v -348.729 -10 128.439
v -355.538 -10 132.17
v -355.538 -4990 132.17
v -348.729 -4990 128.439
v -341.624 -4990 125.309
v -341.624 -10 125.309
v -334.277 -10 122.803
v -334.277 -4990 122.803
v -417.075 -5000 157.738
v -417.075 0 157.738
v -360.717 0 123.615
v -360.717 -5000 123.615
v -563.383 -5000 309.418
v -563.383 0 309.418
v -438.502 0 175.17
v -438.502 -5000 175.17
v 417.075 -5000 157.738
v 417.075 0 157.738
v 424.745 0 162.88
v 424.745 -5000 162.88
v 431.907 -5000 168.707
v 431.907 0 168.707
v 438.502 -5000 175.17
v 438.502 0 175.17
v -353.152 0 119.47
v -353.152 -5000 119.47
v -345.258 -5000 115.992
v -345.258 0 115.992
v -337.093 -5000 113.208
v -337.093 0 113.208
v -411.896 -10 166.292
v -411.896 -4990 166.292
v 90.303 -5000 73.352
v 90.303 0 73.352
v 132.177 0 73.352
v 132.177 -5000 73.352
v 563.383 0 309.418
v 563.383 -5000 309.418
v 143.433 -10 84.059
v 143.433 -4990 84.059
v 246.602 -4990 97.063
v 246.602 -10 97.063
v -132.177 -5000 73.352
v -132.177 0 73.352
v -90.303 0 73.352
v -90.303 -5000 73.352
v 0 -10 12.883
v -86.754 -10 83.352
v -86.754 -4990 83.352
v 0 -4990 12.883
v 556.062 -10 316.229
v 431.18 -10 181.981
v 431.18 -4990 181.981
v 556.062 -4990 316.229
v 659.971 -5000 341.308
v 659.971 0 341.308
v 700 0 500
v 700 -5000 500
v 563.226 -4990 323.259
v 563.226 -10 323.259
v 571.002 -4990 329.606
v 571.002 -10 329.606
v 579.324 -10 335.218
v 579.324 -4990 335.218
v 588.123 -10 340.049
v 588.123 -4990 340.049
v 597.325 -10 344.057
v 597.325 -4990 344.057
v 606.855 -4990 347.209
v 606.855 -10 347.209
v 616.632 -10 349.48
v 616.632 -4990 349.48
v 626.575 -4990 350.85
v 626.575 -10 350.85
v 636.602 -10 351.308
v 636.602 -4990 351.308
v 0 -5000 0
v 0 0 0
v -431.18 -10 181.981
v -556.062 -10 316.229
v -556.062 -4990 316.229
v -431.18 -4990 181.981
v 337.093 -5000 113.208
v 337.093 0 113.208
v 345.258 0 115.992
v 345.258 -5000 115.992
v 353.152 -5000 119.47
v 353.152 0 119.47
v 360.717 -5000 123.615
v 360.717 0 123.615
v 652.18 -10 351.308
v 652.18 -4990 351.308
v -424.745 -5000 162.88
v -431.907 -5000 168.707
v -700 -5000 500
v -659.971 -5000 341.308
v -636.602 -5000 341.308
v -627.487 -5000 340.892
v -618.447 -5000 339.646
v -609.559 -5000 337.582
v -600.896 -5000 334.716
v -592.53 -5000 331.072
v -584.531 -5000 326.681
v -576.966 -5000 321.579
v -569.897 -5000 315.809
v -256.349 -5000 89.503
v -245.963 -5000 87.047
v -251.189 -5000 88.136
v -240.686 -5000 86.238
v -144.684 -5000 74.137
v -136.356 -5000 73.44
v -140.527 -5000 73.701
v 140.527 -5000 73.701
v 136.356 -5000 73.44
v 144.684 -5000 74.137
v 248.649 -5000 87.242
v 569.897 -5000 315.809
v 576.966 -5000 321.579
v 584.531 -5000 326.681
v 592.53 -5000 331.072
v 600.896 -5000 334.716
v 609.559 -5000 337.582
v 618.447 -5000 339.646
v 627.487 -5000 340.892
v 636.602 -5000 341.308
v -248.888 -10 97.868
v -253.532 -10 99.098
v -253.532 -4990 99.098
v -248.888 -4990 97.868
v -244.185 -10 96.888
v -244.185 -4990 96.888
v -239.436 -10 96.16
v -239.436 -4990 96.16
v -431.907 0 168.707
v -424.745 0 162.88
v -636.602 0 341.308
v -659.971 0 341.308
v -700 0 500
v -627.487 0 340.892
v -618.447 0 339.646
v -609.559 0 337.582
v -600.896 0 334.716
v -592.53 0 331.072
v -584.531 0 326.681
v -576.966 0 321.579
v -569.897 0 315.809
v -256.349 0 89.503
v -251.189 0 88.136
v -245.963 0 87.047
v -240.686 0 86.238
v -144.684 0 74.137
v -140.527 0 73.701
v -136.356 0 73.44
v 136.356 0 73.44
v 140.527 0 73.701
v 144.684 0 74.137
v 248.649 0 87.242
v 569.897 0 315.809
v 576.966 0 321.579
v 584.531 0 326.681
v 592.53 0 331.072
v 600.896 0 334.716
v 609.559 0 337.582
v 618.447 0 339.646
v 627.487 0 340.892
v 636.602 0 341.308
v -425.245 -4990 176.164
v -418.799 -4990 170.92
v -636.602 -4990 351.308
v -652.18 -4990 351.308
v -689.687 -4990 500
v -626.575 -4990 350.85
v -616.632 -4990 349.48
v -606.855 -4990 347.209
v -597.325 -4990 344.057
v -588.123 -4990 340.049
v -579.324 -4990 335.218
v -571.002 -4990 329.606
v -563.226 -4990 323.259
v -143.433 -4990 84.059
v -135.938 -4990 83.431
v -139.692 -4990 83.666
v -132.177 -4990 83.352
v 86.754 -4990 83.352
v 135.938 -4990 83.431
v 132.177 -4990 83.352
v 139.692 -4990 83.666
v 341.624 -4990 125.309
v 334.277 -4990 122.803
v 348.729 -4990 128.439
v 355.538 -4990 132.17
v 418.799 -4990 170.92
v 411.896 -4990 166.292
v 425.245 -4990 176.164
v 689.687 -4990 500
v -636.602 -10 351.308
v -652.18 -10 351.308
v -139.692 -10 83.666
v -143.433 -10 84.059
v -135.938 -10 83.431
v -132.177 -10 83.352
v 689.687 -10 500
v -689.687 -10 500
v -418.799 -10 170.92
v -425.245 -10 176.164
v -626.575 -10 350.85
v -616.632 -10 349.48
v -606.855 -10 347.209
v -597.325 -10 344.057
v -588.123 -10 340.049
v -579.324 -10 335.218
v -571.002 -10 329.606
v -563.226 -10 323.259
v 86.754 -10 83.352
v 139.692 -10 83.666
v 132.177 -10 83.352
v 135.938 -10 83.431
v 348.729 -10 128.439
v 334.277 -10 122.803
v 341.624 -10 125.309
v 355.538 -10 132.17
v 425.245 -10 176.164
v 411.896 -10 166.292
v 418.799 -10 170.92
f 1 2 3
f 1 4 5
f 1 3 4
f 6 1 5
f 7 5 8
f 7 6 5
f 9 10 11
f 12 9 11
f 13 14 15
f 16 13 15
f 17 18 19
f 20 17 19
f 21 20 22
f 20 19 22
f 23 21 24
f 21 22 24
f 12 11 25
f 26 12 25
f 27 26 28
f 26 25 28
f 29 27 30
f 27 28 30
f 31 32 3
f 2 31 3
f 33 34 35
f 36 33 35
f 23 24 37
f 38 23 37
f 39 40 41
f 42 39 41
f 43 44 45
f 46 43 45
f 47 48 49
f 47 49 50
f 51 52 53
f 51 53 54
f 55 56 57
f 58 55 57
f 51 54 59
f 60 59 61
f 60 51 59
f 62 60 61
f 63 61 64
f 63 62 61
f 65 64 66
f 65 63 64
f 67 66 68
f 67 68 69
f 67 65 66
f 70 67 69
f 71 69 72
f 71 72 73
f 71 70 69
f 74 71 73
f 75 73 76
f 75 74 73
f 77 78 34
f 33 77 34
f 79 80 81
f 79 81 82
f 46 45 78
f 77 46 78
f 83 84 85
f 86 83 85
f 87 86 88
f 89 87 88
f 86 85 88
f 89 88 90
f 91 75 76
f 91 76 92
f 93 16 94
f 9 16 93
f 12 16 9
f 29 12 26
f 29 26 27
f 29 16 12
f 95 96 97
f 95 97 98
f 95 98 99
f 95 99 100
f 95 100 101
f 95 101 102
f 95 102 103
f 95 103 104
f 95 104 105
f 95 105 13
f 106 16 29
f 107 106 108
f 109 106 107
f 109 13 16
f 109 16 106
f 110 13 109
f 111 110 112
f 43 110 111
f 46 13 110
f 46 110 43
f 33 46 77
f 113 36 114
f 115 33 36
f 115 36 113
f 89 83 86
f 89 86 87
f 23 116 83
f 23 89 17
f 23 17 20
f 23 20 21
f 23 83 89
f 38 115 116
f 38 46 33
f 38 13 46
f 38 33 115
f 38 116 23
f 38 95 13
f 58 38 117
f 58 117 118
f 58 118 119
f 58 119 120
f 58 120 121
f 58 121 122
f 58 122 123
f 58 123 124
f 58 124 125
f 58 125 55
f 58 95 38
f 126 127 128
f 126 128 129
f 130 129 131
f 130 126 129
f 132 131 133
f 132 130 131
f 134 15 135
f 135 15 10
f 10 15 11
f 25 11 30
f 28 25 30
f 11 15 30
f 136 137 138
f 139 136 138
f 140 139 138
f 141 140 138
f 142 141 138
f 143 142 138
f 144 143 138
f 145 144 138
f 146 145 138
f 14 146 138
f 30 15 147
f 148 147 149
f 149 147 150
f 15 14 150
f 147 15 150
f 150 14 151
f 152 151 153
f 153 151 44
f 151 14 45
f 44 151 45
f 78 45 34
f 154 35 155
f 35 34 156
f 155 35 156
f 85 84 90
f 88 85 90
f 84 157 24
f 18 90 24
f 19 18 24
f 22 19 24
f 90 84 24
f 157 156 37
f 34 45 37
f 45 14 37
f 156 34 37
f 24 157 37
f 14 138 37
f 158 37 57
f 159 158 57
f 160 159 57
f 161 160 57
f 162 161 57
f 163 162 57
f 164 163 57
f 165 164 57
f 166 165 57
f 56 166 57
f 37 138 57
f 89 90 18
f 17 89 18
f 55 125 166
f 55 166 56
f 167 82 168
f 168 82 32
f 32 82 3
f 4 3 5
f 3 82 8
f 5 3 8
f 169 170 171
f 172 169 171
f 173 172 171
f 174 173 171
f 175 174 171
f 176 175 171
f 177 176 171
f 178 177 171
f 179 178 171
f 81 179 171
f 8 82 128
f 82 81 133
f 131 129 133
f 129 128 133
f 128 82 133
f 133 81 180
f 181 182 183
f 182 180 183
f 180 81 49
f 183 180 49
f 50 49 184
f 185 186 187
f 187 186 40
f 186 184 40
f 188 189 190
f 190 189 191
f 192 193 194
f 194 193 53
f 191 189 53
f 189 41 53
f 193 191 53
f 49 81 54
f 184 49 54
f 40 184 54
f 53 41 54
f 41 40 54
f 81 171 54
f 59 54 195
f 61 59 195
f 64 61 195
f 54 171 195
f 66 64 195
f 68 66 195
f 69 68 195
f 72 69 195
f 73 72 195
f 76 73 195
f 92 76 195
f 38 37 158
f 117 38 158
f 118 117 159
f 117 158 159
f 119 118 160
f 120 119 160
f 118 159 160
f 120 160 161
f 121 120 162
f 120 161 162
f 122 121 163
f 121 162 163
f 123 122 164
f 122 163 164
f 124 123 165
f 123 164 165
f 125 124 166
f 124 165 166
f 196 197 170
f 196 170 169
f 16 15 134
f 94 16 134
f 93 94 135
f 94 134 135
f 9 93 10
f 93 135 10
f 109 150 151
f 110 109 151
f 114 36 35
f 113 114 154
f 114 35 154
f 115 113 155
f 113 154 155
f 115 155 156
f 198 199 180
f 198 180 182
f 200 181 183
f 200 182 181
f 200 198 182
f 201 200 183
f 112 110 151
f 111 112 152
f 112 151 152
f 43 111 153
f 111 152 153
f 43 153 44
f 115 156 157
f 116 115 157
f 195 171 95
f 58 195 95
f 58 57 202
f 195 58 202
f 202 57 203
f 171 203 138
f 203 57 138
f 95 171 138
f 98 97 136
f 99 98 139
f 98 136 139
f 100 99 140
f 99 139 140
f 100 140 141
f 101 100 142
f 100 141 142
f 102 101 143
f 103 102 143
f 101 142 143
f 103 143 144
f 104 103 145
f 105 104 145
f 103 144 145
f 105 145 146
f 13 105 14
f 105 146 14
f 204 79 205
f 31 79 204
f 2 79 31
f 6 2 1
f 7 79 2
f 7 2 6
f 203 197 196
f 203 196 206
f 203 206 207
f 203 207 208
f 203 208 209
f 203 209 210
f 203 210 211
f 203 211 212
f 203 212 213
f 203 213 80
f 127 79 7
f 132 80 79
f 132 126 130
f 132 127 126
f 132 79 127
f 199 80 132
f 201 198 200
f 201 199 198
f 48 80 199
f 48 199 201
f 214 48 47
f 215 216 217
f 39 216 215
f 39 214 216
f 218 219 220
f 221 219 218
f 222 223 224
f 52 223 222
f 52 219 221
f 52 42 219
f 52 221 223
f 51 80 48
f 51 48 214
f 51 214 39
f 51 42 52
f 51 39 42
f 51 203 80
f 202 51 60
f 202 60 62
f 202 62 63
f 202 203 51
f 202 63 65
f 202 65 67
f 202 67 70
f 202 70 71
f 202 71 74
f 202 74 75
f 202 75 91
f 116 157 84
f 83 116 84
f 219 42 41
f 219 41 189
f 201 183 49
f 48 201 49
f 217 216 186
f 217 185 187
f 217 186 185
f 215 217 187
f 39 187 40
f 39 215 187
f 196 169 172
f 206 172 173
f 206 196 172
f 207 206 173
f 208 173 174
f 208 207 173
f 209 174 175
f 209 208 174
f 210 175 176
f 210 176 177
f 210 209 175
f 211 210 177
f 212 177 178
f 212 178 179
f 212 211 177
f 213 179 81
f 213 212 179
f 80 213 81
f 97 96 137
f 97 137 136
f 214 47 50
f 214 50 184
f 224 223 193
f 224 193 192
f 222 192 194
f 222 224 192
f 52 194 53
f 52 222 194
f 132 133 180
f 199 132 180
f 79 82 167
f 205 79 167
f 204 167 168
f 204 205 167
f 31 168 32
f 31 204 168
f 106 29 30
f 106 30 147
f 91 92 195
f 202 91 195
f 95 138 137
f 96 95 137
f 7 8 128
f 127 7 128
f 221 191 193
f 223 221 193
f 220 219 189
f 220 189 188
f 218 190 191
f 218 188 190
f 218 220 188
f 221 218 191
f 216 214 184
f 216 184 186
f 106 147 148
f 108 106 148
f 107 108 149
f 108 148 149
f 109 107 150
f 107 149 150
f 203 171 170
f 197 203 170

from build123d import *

# Parameters (mm, degrees)
F2_DEPTH = 5000
F3_T     = -10


with BuildPart() as f2:
    # F0 (on Front) → F2 (new body)
    with BuildSketch(Plane.XZ):
        with BuildLine():
            Line((-90.3032645583, 73.3521804214), (0, 0))
            Line((0, 0), (0, 500))
            Line((0, 500), (-700, 500))
            Line((-700, 500), (-659.9707603455, 341.3078779773))
            Line((-659.9707603455, 341.3078779773), (-636.6021653731, 341.3078779773))
            ThreePointArc((-636.6021653731, 341.3078779773), (-596.6712163725, 332.9894972469), (-563.3834841061, 309.4182642155))
            Line((-563.3834841061, 309.4182642155), (-438.5016734996, 175.1702883654))
            ThreePointArc((-438.5016734996, 175.1702883654), (-428.3932790461, 165.710759699), (-417.0752981876, 157.7379540258))
            Line((-417.0752981876, 157.7379540258), (-360.7167568947, 123.615368327))
            ThreePointArc((-360.7167568947, 123.615368327), (-349.2423377723, 117.6459694815), (-337.0934164626, 113.2075319426))
            Line((-337.0934164626, 113.2075319426), (-256.349216299, 89.5028171123))
            ThreePointArc((-256.349216299, 89.5028171123), (-248.5831629557, 87.5568921429), (-240.6863306004, 86.2384660848))
            Line((-240.6863306004, 86.2384660848), (-144.6835198288, 74.1372724315))
            ThreePointArc((-144.6835198288, 74.1372724315), (-138.4427891974, 73.5486464183), (-132.1774400044, 73.3521804214))
            Line((-132.1774400044, 73.3521804214), (-90.3032645583, 73.3521804214))
        make_face()
        with BuildLine():
            Line((0, 500), (0, 0))
            Line((0, 0), (90.3032645583, 73.3521804214))
            Line((90.3032645583, 73.3521804214), (132.1774400044, 73.3521804214))
            ThreePointArc((132.1774400044, 73.3521804214), (138.4427891974, 73.5486464183), (144.6835198288, 74.1372724315))
            Line((144.6835198288, 74.1372724315), (248.6487627029, 87.2421339154))
            Line((248.6487627029, 87.2421339154), (337.0934164626, 113.2075319426))
            ThreePointArc((337.0934164626, 113.2075319426), (349.2423377723, 117.6459694815), (360.7167568947, 123.615368327))
            Line((360.7167568947, 123.615368327), (417.0752981876, 157.7379540258))
            ThreePointArc((417.0752981876, 157.7379540258), (428.3932790461, 165.710759699), (438.5016734996, 175.1702883654))
            Line((438.5016734996, 175.1702883654), (563.3834841061, 309.4182642155))
            ThreePointArc((563.3834841061, 309.4182642155), (596.6712163725, 332.9894972469), (636.6021653731, 341.3078779773))
            Line((636.6021653731, 341.3078779773), (659.9707603455, 341.3078779773))
            Line((659.9707603455, 341.3078779773), (700, 500))
            Line((700, 500), (0, 500))
        make_face()
    extrude(amount=F2_DEPTH)

    # F3
    f3_openings = [f2.faces().sort_by_distance(p)[0] for p in [
        (0, -2500, 500),
    ]]
    offset(amount=F3_T, openings=f3_openings, kind=Kind.INTERSECTION)


solid = f2.part
